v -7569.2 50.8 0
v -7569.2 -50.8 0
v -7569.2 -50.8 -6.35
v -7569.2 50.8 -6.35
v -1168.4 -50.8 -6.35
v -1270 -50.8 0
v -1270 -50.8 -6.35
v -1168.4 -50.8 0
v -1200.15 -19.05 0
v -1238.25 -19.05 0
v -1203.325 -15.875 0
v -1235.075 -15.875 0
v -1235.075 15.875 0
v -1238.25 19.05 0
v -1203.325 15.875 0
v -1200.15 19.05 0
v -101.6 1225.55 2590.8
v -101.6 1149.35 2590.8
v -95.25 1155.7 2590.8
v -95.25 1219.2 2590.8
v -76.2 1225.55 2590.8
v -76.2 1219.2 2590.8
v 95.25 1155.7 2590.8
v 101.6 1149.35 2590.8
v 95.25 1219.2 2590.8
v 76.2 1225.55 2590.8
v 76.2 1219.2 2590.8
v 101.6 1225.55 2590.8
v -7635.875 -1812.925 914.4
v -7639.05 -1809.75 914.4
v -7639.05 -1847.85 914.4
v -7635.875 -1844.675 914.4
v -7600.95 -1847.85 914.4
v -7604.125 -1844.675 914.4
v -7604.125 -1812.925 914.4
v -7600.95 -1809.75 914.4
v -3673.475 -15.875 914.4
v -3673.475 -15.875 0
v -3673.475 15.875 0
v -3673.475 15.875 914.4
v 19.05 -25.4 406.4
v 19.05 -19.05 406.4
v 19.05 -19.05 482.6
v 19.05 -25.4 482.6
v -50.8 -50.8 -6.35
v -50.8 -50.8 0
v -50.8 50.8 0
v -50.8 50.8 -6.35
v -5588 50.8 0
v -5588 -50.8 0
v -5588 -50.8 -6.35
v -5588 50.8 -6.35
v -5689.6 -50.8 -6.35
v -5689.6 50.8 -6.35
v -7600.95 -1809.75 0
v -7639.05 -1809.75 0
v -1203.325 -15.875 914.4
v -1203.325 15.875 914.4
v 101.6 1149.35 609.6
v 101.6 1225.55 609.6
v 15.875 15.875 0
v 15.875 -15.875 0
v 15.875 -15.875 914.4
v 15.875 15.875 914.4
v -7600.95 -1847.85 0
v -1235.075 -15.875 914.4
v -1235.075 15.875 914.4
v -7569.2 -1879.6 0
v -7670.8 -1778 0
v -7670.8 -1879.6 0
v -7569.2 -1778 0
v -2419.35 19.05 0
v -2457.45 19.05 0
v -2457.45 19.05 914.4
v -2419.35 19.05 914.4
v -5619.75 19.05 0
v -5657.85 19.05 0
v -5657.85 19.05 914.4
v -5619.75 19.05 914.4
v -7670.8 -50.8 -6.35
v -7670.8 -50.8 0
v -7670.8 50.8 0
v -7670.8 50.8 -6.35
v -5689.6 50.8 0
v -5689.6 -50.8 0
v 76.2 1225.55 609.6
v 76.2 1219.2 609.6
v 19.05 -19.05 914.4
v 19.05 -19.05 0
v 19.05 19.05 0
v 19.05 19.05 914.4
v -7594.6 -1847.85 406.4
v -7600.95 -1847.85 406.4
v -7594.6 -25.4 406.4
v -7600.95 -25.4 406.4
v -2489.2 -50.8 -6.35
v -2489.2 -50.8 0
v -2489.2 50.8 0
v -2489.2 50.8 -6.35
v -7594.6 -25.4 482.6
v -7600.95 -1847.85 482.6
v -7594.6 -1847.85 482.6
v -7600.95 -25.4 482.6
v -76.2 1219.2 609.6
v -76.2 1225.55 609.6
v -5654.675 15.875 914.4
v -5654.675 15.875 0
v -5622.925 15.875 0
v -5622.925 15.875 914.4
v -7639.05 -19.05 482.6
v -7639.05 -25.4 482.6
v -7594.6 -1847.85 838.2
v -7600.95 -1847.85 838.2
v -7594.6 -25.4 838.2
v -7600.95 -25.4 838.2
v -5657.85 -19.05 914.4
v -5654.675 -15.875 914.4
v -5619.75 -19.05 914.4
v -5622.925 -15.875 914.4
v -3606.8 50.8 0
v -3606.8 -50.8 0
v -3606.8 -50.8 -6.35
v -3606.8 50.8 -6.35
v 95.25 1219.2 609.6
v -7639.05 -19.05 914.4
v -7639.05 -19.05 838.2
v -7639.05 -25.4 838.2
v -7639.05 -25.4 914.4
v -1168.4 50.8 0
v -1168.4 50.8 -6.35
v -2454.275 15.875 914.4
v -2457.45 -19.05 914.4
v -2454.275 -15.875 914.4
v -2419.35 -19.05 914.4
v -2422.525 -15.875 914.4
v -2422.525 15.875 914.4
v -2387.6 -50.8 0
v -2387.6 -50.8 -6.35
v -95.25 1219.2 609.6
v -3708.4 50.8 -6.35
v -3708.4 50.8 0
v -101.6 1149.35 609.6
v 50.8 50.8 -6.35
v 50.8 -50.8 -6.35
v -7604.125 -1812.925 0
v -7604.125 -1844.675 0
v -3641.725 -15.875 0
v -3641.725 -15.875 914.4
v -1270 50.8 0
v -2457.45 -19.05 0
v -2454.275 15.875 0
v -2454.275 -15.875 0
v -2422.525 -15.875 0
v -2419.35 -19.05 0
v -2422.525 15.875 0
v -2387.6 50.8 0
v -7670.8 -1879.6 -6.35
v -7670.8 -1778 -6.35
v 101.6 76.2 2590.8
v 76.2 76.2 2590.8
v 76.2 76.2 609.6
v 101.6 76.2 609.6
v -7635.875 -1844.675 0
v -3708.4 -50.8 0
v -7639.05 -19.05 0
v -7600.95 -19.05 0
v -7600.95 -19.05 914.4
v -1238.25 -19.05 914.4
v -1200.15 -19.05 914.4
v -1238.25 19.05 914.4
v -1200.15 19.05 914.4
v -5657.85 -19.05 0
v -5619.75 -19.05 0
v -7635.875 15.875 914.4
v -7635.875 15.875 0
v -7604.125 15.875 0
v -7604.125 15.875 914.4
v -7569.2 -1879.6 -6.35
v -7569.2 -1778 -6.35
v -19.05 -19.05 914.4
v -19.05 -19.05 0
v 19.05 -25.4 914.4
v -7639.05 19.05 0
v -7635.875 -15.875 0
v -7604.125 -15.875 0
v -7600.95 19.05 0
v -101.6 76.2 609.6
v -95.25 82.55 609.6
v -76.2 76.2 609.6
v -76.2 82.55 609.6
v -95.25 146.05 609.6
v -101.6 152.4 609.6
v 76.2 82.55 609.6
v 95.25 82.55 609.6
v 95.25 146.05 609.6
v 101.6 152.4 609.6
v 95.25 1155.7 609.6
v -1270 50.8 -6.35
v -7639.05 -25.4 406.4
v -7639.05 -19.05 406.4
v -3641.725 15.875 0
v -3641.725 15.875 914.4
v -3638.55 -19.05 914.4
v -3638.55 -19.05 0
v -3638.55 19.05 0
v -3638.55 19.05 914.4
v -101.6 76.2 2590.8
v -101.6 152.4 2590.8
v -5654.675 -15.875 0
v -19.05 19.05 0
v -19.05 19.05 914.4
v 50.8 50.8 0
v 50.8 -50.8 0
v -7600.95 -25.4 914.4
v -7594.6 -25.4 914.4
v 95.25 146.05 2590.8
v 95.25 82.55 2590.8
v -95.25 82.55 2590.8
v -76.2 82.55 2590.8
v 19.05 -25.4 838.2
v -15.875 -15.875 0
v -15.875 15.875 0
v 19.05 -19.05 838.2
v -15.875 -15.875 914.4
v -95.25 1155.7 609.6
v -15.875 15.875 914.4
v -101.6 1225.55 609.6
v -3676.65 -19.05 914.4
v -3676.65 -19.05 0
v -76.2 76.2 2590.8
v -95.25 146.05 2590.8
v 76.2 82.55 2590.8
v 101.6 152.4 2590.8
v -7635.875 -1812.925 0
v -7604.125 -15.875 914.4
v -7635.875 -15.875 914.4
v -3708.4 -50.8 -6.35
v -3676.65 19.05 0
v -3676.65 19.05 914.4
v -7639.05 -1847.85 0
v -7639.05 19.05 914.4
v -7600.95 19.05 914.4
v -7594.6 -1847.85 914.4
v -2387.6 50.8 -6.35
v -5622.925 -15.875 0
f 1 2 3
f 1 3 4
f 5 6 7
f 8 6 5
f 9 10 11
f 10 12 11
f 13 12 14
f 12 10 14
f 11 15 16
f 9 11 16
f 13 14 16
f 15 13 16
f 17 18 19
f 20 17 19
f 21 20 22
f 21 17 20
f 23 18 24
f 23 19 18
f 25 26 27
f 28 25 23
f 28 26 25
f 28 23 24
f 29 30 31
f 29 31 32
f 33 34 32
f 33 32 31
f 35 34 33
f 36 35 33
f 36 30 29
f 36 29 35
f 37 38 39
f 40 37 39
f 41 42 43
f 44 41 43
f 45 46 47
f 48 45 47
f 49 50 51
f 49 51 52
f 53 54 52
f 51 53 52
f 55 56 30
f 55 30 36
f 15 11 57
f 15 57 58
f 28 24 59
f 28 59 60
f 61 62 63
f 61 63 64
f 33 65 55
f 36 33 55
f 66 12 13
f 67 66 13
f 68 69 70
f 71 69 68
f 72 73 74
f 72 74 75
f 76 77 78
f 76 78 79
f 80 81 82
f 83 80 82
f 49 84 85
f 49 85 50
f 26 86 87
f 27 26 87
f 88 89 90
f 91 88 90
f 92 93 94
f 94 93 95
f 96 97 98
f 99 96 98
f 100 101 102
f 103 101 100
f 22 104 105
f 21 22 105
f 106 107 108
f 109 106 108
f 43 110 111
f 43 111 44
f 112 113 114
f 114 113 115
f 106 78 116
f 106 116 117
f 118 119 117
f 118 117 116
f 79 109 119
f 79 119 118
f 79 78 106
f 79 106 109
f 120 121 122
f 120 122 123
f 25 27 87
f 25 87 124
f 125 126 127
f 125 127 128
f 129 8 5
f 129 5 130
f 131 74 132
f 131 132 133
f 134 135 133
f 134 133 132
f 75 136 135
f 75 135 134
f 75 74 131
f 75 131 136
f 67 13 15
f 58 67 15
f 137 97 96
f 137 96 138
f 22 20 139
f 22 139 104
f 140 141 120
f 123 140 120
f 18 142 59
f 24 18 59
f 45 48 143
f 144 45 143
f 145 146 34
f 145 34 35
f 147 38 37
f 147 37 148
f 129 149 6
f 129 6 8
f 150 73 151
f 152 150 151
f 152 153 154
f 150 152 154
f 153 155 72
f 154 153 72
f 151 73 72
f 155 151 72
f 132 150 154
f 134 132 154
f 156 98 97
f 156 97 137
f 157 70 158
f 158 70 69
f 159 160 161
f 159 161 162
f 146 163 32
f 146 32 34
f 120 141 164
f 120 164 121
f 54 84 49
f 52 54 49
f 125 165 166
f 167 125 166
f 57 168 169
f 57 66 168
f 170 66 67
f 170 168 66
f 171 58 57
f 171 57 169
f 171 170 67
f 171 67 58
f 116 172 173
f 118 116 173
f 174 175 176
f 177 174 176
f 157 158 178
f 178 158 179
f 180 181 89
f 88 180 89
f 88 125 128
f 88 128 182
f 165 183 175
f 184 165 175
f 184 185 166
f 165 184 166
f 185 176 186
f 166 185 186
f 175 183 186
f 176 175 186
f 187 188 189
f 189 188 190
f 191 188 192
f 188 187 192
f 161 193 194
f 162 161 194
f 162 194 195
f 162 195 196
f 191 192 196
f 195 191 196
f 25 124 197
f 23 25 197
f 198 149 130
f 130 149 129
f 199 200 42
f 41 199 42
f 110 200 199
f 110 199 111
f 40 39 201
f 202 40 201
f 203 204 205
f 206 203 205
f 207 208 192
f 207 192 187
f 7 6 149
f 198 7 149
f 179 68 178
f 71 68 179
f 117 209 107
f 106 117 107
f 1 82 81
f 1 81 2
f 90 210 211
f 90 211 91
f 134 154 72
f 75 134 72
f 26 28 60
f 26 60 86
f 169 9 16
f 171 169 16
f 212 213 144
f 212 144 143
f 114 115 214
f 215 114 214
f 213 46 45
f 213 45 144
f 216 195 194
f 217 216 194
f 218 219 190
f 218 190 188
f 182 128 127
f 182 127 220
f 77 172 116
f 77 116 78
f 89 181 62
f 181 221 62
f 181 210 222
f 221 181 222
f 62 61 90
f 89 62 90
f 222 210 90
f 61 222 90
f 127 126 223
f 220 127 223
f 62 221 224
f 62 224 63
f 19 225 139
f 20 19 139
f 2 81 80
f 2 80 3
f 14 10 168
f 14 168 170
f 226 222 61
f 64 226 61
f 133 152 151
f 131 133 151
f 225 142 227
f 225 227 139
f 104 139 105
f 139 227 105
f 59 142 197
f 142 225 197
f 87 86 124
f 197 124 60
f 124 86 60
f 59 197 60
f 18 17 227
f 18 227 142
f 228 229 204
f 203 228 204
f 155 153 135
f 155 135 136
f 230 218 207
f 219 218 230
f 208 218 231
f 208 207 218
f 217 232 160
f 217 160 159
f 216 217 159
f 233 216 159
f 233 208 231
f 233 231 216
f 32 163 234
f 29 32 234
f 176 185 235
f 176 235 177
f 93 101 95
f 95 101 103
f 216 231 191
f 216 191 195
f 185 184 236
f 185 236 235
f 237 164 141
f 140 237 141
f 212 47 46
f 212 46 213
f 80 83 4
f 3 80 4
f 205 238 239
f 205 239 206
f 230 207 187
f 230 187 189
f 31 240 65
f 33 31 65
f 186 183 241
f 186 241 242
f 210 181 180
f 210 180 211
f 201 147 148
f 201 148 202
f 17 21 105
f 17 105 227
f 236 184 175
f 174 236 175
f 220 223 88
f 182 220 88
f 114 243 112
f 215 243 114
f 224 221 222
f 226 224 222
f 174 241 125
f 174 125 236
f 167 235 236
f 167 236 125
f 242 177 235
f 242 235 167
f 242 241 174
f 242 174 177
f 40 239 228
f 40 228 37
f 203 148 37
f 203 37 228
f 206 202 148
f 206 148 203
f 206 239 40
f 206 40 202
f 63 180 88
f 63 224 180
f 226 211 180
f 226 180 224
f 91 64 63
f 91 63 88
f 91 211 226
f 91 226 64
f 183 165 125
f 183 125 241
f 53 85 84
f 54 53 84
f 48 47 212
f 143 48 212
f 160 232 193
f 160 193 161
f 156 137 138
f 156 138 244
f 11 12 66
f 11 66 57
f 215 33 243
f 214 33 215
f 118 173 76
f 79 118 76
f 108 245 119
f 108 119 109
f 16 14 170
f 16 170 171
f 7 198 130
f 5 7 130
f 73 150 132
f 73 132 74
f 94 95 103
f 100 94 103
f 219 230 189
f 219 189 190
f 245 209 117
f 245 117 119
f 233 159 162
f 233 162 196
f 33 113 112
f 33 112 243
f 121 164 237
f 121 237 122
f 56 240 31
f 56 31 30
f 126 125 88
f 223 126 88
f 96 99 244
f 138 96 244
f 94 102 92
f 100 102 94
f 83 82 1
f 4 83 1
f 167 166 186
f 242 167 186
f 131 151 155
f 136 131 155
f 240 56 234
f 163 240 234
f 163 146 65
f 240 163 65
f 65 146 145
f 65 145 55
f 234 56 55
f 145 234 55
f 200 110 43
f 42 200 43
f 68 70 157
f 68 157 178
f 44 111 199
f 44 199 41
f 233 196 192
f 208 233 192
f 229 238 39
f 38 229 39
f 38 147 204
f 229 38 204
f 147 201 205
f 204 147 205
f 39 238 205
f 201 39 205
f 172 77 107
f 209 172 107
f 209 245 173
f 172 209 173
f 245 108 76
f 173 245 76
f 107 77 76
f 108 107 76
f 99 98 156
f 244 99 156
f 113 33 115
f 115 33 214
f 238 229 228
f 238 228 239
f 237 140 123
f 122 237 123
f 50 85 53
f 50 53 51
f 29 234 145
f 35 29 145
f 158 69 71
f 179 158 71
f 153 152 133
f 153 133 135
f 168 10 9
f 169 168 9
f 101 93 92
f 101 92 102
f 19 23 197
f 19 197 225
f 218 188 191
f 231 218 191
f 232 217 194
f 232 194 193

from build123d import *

# Parameters (mm, degrees)
F3_DEPTH  = 1981.2
F0_W      = 38.1
F0_H      = 38.1
F0_W_2    = 31.75
F0_H_2    = 31.75
F4_DEPTH  = 914.4
F5_W      = 101.6
F5_H      = 101.6
F6_DEPTH  = 6.35
F8_W      = 7658.1
F8_H      = 76.2
F9_DEPTH  = 6.35
F11_W     = 1822.45
F11_H     = 76.2
F12_DEPTH = 6.35


with BuildPart() as f3:
    # F2 (on offset) → F3 (new body)
    with BuildSketch(Plane.XY.offset(609.6)):
        Polygon((-76.2, 76.2), (-76.2, 82.55), (-95.25, 82.55), (-95.25, 146.05), (95.25, 146.05), (95.25, 82.55), (76.2, 82.55), (76.2, 76.2), (101.6, 76.2), (101.6, 152.4), (-101.6, 152.4), (-101.6, 76.2), align=None)
        Polygon((101.6, 1149.35), (101.6, 1225.55), (76.2, 1225.55), (76.2, 1219.2), (95.25, 1219.2), (95.25, 1155.7), (-95.25, 1155.7), (-95.25, 1219.2), (-76.2, 1219.2), (-76.2, 1225.55), (-101.6, 1225.55), (-101.6, 1149.35), align=None)
    extrude(amount=F3_DEPTH)


with BuildPart() as f4:
    # F0 (on Top) → F4 (new body)
    with BuildSketch(Plane.XY):
        with Locations((-7620, -1828.8)):
            Rectangle(F0_W, F0_H)
        with Locations((-7620, -1828.8)):
            Rectangle(F0_W_2, F0_H_2, mode=Mode.SUBTRACT)
        with Locations((-7620, 0)):
            Rectangle(F0_W, F0_H)
        with Locations((-7620, 0)):
            Rectangle(F0_W_2, F0_H_2, mode=Mode.SUBTRACT)
        with Locations((-5638.8, 0)):
            Rectangle(F0_W, F0_H)
        with Locations((-5638.8, 0)):
            Rectangle(F0_W_2, F0_H_2, mode=Mode.SUBTRACT)
        with Locations((-3657.6, 0)):
            Rectangle(F0_W, F0_H)
        with Locations((-3657.6, 0)):
            Rectangle(F0_W_2, F0_H_2, mode=Mode.SUBTRACT)
        with Locations((-2438.4, 0)):
            Rectangle(F0_W, F0_H)
        with Locations((-2438.4, 0)):
            Rectangle(F0_W_2, F0_H_2, mode=Mode.SUBTRACT)
        with Locations((-1219.2, 0)):
            Rectangle(F0_W, F0_H)
        with Locations((-1219.2, 0)):
            Rectangle(F0_W_2, F0_H_2, mode=Mode.SUBTRACT)
        Rectangle(F0_W, F0_H)
        Rectangle(F0_W_2, F0_H_2, mode=Mode.SUBTRACT)
    extrude(amount=F4_DEPTH)


with BuildPart() as f6:
    # F5 (on Top) → F6 (new body)
    with BuildSketch(Plane.XY):
        Rectangle(F5_W, F5_H)
        with Locations((-1219.2, 0)):
            Rectangle(F5_W, F5_H)
        with Locations((-2438.4, 0)):
            Rectangle(F5_W, F5_H)
        with Locations((-3657.6, 0)):
            Rectangle(F5_W, F5_H)
        with Locations((-5638.8, 0)):
            Rectangle(F5_W, F5_H)
        with Locations((-7620, 0)):
            Rectangle(F5_W, F5_H)
        with Locations((-7620, -1828.8)):
            Rectangle(F5_W, F5_H)
    extrude(amount=-F6_DEPTH)


with BuildPart() as f9:
    # F8 (on offset) → F9 (new body)
    with BuildSketch(Plane.XZ.offset(19.05)):
        with Locations((-3810, 876.3)):
            Rectangle(F8_W, F8_H)
        with Locations((-3810, 444.5)):
            Rectangle(F8_W, F8_H)
    extrude(amount=F9_DEPTH)


with BuildPart() as f12:
    # F11 (on offset) → F12 (new body)
    with BuildSketch(Plane.YZ.offset(-7600.95)):
        with Locations((-936.625, 876.3)):
            Rectangle(F11_W, F11_H)
        with Locations((-936.625, 444.5)):
            Rectangle(F11_W, F11_H)
    extrude(amount=F12_DEPTH)


solid = Compound([f3.part, f4.part, f6.part, f9.part, f12.part])
